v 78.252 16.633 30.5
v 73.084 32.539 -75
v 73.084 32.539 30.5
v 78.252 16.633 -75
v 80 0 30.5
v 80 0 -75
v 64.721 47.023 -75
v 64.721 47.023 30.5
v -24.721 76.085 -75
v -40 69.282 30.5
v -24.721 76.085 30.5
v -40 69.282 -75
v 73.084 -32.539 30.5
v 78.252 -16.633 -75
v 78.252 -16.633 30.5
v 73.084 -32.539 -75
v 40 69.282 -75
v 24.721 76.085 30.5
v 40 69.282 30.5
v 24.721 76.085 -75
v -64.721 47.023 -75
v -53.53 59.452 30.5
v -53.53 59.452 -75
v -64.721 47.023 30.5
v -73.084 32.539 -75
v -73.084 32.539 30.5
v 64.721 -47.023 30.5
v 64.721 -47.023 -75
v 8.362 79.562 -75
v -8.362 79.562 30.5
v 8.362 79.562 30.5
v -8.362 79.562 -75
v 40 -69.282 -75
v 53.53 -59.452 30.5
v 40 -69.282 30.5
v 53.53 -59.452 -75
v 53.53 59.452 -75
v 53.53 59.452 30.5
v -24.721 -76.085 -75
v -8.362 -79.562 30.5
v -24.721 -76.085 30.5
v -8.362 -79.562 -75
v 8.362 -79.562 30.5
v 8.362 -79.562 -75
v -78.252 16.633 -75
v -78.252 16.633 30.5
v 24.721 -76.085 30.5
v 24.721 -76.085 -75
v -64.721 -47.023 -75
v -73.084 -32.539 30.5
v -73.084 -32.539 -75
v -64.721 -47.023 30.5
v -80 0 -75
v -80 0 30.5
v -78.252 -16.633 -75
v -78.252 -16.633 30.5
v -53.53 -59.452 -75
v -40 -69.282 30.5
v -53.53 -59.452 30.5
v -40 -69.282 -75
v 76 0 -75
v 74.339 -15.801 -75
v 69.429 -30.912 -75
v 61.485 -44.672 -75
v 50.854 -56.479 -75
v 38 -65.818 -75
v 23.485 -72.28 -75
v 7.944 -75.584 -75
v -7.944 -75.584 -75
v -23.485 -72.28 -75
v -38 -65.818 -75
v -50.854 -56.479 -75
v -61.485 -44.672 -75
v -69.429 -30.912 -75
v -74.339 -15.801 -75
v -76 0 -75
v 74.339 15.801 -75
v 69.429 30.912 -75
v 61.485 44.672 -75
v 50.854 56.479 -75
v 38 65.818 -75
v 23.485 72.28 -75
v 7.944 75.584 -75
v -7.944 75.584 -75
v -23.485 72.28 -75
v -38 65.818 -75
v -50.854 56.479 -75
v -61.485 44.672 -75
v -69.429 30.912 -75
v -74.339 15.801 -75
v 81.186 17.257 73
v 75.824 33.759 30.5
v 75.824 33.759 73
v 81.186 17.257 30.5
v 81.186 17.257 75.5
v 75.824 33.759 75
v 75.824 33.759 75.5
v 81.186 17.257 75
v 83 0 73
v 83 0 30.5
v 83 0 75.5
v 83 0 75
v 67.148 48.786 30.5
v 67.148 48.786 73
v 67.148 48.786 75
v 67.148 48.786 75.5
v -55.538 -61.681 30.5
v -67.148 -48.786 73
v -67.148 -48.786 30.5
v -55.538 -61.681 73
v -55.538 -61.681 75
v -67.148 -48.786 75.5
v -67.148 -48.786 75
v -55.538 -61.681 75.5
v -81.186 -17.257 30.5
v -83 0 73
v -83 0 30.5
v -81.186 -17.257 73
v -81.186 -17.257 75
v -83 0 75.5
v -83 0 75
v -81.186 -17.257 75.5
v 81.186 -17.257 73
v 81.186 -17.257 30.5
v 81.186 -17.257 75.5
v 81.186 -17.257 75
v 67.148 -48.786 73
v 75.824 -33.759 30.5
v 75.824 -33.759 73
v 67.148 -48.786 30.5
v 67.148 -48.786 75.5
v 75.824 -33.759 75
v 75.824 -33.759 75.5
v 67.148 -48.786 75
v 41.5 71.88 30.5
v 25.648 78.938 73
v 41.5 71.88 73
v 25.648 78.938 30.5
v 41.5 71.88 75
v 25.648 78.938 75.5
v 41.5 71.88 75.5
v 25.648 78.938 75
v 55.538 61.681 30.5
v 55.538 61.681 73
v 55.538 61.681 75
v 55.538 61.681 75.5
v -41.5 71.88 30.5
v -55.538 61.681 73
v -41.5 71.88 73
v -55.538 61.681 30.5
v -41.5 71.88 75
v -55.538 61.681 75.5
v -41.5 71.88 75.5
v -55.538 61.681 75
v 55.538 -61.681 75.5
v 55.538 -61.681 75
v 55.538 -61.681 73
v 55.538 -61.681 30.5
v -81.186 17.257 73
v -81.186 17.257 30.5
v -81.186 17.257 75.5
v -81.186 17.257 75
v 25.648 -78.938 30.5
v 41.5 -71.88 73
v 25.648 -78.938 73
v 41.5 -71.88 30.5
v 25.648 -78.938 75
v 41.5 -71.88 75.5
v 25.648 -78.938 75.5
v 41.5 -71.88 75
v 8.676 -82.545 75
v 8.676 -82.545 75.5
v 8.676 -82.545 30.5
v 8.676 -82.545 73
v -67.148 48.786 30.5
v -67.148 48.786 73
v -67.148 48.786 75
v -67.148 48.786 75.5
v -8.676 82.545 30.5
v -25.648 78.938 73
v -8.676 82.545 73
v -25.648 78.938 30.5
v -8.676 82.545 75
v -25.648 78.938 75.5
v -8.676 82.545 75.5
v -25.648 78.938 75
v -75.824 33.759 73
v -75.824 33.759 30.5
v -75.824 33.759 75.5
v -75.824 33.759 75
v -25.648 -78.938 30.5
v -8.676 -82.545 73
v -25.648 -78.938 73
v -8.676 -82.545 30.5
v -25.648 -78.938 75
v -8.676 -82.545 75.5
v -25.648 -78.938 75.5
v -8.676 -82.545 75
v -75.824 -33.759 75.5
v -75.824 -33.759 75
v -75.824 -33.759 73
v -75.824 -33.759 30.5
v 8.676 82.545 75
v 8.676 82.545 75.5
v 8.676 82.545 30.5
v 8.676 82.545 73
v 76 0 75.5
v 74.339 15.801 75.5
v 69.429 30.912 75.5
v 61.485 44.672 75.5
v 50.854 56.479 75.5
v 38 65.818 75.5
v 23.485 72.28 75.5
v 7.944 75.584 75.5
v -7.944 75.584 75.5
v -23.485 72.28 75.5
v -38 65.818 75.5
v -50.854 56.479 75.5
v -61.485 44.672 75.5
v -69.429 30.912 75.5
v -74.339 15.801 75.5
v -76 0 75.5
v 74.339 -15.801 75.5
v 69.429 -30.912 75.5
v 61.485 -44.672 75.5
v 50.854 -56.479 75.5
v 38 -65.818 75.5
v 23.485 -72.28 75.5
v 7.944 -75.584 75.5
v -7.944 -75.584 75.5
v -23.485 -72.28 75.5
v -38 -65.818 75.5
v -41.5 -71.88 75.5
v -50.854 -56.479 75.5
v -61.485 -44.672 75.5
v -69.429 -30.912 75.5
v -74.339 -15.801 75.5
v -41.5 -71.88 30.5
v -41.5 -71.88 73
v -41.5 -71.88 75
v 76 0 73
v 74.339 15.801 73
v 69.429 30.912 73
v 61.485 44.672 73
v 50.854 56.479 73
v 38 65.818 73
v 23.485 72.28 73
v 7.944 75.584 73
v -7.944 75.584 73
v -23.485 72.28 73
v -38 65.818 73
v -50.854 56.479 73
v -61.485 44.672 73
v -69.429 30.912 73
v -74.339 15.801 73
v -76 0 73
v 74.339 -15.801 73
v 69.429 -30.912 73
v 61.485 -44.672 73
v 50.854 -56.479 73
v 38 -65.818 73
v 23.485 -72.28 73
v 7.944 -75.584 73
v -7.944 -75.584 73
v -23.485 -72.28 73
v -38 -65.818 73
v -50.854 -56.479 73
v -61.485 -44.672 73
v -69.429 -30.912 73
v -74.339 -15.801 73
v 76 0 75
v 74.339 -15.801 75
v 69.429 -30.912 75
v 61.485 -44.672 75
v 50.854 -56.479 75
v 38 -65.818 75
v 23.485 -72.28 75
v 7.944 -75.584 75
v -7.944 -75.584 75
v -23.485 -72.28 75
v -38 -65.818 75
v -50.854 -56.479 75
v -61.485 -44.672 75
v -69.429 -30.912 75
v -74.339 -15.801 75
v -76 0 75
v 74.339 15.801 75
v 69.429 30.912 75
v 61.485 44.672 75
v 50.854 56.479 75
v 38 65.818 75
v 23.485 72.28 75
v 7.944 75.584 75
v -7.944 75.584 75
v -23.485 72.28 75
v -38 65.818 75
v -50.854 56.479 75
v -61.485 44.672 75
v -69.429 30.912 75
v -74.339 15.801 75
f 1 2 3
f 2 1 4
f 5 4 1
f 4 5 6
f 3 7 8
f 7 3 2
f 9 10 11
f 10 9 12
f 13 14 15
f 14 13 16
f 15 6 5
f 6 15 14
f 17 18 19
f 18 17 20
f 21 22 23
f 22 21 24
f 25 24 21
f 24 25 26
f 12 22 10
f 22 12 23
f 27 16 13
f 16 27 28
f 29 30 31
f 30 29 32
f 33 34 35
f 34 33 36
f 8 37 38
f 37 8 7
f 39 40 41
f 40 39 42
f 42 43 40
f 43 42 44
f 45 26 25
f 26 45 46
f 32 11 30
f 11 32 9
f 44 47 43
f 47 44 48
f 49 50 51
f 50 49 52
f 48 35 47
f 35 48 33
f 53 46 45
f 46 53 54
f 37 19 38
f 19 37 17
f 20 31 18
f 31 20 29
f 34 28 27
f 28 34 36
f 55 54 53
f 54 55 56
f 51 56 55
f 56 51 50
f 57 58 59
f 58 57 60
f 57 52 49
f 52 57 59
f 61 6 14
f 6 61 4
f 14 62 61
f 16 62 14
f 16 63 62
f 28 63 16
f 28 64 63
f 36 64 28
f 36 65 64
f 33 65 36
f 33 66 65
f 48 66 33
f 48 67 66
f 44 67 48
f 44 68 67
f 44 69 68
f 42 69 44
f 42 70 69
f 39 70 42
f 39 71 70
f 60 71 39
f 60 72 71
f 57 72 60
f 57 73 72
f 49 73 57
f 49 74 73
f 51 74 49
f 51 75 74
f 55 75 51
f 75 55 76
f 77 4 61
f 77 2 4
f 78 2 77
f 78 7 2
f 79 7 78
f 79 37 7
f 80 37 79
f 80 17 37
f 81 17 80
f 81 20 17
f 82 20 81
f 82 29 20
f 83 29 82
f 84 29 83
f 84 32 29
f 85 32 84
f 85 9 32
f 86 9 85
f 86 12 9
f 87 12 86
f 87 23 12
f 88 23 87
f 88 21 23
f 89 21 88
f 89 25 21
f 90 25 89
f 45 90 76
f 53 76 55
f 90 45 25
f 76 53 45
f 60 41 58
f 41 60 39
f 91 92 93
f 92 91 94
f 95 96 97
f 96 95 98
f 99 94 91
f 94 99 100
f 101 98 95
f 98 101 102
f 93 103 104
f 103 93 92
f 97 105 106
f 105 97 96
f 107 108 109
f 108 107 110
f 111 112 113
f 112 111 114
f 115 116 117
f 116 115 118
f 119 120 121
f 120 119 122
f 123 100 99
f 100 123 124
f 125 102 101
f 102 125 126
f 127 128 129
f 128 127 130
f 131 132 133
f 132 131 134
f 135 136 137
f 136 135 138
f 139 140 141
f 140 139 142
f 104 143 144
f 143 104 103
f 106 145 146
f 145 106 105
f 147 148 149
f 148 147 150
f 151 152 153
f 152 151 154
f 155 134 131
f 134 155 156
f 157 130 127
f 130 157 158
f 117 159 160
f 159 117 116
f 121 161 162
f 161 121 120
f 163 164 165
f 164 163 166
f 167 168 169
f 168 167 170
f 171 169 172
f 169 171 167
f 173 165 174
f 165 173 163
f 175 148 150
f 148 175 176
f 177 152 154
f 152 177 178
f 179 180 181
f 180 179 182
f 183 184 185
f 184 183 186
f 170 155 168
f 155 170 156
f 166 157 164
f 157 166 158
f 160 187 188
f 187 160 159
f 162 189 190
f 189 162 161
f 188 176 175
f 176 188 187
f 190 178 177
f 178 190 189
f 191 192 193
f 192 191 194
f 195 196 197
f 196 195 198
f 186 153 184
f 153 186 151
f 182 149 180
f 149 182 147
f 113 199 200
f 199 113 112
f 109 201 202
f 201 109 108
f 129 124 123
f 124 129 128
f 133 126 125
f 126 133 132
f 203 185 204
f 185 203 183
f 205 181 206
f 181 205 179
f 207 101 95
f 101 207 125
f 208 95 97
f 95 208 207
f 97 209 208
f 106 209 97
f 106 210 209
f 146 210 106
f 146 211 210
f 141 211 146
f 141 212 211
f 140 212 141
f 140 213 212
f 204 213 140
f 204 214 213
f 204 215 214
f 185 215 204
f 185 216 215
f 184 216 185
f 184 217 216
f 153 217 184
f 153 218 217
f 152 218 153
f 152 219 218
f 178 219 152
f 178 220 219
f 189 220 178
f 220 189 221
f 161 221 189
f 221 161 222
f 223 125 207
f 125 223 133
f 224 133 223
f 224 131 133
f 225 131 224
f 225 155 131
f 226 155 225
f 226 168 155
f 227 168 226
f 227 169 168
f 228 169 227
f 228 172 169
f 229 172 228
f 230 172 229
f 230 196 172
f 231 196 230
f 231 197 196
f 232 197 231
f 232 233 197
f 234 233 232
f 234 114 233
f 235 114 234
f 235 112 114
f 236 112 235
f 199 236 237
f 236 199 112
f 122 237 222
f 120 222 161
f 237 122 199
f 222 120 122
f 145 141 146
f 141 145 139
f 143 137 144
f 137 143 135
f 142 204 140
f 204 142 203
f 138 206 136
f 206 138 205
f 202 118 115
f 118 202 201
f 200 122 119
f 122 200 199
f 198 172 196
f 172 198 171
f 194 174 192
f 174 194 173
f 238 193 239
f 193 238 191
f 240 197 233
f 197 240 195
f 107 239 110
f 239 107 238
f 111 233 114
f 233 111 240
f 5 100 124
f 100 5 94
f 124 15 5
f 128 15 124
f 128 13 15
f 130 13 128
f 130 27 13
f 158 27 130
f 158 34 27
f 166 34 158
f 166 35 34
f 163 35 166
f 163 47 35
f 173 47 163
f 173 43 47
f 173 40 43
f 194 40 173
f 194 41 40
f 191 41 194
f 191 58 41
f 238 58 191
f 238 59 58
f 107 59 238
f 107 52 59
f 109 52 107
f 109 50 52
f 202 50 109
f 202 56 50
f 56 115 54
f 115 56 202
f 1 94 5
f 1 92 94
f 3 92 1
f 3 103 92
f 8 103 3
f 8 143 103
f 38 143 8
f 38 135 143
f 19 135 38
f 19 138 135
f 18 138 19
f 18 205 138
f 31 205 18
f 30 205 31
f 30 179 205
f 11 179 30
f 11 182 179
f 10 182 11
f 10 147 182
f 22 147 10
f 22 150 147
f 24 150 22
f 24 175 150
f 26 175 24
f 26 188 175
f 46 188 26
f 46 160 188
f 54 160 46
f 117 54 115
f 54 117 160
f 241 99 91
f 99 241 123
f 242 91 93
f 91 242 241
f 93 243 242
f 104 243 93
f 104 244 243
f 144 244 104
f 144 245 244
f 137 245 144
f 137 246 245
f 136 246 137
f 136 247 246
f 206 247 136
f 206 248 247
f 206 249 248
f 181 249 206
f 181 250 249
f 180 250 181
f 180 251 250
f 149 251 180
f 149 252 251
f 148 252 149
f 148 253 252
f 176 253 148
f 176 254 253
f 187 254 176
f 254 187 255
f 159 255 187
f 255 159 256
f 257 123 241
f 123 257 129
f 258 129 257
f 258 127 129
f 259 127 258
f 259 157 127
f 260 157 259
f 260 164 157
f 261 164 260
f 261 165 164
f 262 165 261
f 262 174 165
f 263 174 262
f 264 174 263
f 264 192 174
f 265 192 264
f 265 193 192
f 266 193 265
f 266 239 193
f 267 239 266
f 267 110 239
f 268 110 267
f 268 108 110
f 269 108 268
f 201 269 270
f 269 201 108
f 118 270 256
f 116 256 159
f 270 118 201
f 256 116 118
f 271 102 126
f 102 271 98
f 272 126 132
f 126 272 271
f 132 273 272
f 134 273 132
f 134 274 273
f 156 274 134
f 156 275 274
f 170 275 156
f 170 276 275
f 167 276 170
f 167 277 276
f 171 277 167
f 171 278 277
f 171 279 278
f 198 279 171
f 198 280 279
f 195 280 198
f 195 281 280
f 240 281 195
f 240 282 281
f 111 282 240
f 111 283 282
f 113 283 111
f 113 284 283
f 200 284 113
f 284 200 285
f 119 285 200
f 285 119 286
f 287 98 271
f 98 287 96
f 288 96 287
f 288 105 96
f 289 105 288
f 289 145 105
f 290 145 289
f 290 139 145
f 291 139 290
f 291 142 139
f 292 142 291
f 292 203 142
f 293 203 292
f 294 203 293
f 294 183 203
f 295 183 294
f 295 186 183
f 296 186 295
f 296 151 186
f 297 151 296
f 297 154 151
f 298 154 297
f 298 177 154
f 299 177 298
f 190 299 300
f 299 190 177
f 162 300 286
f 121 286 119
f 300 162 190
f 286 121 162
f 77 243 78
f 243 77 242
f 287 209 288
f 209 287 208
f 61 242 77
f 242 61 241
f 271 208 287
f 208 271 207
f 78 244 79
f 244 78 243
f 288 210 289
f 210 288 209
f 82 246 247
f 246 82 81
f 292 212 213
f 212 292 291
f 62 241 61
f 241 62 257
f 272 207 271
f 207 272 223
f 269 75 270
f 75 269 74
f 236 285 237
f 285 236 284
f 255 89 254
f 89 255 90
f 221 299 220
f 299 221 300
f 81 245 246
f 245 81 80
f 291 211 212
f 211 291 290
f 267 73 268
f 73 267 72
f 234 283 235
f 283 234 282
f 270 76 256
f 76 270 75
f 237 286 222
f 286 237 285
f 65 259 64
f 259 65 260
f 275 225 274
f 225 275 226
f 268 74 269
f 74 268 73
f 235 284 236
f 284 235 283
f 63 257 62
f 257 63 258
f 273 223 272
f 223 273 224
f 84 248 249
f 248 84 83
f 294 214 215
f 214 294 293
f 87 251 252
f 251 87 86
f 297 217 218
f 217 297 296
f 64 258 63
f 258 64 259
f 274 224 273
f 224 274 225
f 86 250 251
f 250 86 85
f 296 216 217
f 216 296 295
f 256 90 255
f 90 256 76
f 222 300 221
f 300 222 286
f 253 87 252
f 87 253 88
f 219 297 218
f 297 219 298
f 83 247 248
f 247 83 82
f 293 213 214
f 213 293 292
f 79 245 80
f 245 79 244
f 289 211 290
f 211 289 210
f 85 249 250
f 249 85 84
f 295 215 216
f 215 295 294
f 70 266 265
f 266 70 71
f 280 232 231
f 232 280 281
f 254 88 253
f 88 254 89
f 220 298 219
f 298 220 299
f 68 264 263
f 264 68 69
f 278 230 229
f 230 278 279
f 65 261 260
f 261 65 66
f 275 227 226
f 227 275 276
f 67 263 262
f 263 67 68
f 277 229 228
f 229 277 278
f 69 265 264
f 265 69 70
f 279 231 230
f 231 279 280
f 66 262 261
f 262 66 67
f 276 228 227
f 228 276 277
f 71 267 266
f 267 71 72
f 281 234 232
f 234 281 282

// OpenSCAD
// Parameters
outer_diameter = 160; //[80:320:1]
length = 150; //[75:300:1]
wall_thickness = 4; //[2:8:0.5]
socket_length = 45; //[20:90:1]
socket_extra_radius = 3; //[1:8:0.5]
chamfer_length = 2; //[1:6:0.5]
overlap = 1; //[0.5:2:0.5]

// Base Shapes
module pipe_body() {
  translate([0, 0, 0])
    cylinder(h=length, r=outer_diameter/2, center=true);
}

module inner_bore() {
  translate([0, 0, 0])
    cylinder(h=length + 2*overlap, r=outer_diameter/2 - wall_thickness, center=true);
}

module socket_end() {
  translate([0, 0, length/2 - socket_length/2 + overlap/2])
    cylinder(h=socket_length, r=outer_diameter/2 + socket_extra_radius, center=true);
}

module chamfer_edges() {
  translate([0, 0, length/2 - chamfer_length/2])
    cylinder(h=chamfer_length, r1=outer_diameter/2 + socket_extra_radius + overlap, r2=outer_diameter/2 + socket_extra_radius, center=true);
}

// Operations
module outer_with_socket() {
  union() {
    pipe_body();
    socket_end();
  }
}

module outer_minus_chamfer() {
  difference() {
    outer_with_socket();
    chamfer_edges();
  }
}

module final_pipe() {
  difference() {
    outer_minus_chamfer();
    inner_bore();
  }
}

// Final Output
color("Silver") final_pipe();
